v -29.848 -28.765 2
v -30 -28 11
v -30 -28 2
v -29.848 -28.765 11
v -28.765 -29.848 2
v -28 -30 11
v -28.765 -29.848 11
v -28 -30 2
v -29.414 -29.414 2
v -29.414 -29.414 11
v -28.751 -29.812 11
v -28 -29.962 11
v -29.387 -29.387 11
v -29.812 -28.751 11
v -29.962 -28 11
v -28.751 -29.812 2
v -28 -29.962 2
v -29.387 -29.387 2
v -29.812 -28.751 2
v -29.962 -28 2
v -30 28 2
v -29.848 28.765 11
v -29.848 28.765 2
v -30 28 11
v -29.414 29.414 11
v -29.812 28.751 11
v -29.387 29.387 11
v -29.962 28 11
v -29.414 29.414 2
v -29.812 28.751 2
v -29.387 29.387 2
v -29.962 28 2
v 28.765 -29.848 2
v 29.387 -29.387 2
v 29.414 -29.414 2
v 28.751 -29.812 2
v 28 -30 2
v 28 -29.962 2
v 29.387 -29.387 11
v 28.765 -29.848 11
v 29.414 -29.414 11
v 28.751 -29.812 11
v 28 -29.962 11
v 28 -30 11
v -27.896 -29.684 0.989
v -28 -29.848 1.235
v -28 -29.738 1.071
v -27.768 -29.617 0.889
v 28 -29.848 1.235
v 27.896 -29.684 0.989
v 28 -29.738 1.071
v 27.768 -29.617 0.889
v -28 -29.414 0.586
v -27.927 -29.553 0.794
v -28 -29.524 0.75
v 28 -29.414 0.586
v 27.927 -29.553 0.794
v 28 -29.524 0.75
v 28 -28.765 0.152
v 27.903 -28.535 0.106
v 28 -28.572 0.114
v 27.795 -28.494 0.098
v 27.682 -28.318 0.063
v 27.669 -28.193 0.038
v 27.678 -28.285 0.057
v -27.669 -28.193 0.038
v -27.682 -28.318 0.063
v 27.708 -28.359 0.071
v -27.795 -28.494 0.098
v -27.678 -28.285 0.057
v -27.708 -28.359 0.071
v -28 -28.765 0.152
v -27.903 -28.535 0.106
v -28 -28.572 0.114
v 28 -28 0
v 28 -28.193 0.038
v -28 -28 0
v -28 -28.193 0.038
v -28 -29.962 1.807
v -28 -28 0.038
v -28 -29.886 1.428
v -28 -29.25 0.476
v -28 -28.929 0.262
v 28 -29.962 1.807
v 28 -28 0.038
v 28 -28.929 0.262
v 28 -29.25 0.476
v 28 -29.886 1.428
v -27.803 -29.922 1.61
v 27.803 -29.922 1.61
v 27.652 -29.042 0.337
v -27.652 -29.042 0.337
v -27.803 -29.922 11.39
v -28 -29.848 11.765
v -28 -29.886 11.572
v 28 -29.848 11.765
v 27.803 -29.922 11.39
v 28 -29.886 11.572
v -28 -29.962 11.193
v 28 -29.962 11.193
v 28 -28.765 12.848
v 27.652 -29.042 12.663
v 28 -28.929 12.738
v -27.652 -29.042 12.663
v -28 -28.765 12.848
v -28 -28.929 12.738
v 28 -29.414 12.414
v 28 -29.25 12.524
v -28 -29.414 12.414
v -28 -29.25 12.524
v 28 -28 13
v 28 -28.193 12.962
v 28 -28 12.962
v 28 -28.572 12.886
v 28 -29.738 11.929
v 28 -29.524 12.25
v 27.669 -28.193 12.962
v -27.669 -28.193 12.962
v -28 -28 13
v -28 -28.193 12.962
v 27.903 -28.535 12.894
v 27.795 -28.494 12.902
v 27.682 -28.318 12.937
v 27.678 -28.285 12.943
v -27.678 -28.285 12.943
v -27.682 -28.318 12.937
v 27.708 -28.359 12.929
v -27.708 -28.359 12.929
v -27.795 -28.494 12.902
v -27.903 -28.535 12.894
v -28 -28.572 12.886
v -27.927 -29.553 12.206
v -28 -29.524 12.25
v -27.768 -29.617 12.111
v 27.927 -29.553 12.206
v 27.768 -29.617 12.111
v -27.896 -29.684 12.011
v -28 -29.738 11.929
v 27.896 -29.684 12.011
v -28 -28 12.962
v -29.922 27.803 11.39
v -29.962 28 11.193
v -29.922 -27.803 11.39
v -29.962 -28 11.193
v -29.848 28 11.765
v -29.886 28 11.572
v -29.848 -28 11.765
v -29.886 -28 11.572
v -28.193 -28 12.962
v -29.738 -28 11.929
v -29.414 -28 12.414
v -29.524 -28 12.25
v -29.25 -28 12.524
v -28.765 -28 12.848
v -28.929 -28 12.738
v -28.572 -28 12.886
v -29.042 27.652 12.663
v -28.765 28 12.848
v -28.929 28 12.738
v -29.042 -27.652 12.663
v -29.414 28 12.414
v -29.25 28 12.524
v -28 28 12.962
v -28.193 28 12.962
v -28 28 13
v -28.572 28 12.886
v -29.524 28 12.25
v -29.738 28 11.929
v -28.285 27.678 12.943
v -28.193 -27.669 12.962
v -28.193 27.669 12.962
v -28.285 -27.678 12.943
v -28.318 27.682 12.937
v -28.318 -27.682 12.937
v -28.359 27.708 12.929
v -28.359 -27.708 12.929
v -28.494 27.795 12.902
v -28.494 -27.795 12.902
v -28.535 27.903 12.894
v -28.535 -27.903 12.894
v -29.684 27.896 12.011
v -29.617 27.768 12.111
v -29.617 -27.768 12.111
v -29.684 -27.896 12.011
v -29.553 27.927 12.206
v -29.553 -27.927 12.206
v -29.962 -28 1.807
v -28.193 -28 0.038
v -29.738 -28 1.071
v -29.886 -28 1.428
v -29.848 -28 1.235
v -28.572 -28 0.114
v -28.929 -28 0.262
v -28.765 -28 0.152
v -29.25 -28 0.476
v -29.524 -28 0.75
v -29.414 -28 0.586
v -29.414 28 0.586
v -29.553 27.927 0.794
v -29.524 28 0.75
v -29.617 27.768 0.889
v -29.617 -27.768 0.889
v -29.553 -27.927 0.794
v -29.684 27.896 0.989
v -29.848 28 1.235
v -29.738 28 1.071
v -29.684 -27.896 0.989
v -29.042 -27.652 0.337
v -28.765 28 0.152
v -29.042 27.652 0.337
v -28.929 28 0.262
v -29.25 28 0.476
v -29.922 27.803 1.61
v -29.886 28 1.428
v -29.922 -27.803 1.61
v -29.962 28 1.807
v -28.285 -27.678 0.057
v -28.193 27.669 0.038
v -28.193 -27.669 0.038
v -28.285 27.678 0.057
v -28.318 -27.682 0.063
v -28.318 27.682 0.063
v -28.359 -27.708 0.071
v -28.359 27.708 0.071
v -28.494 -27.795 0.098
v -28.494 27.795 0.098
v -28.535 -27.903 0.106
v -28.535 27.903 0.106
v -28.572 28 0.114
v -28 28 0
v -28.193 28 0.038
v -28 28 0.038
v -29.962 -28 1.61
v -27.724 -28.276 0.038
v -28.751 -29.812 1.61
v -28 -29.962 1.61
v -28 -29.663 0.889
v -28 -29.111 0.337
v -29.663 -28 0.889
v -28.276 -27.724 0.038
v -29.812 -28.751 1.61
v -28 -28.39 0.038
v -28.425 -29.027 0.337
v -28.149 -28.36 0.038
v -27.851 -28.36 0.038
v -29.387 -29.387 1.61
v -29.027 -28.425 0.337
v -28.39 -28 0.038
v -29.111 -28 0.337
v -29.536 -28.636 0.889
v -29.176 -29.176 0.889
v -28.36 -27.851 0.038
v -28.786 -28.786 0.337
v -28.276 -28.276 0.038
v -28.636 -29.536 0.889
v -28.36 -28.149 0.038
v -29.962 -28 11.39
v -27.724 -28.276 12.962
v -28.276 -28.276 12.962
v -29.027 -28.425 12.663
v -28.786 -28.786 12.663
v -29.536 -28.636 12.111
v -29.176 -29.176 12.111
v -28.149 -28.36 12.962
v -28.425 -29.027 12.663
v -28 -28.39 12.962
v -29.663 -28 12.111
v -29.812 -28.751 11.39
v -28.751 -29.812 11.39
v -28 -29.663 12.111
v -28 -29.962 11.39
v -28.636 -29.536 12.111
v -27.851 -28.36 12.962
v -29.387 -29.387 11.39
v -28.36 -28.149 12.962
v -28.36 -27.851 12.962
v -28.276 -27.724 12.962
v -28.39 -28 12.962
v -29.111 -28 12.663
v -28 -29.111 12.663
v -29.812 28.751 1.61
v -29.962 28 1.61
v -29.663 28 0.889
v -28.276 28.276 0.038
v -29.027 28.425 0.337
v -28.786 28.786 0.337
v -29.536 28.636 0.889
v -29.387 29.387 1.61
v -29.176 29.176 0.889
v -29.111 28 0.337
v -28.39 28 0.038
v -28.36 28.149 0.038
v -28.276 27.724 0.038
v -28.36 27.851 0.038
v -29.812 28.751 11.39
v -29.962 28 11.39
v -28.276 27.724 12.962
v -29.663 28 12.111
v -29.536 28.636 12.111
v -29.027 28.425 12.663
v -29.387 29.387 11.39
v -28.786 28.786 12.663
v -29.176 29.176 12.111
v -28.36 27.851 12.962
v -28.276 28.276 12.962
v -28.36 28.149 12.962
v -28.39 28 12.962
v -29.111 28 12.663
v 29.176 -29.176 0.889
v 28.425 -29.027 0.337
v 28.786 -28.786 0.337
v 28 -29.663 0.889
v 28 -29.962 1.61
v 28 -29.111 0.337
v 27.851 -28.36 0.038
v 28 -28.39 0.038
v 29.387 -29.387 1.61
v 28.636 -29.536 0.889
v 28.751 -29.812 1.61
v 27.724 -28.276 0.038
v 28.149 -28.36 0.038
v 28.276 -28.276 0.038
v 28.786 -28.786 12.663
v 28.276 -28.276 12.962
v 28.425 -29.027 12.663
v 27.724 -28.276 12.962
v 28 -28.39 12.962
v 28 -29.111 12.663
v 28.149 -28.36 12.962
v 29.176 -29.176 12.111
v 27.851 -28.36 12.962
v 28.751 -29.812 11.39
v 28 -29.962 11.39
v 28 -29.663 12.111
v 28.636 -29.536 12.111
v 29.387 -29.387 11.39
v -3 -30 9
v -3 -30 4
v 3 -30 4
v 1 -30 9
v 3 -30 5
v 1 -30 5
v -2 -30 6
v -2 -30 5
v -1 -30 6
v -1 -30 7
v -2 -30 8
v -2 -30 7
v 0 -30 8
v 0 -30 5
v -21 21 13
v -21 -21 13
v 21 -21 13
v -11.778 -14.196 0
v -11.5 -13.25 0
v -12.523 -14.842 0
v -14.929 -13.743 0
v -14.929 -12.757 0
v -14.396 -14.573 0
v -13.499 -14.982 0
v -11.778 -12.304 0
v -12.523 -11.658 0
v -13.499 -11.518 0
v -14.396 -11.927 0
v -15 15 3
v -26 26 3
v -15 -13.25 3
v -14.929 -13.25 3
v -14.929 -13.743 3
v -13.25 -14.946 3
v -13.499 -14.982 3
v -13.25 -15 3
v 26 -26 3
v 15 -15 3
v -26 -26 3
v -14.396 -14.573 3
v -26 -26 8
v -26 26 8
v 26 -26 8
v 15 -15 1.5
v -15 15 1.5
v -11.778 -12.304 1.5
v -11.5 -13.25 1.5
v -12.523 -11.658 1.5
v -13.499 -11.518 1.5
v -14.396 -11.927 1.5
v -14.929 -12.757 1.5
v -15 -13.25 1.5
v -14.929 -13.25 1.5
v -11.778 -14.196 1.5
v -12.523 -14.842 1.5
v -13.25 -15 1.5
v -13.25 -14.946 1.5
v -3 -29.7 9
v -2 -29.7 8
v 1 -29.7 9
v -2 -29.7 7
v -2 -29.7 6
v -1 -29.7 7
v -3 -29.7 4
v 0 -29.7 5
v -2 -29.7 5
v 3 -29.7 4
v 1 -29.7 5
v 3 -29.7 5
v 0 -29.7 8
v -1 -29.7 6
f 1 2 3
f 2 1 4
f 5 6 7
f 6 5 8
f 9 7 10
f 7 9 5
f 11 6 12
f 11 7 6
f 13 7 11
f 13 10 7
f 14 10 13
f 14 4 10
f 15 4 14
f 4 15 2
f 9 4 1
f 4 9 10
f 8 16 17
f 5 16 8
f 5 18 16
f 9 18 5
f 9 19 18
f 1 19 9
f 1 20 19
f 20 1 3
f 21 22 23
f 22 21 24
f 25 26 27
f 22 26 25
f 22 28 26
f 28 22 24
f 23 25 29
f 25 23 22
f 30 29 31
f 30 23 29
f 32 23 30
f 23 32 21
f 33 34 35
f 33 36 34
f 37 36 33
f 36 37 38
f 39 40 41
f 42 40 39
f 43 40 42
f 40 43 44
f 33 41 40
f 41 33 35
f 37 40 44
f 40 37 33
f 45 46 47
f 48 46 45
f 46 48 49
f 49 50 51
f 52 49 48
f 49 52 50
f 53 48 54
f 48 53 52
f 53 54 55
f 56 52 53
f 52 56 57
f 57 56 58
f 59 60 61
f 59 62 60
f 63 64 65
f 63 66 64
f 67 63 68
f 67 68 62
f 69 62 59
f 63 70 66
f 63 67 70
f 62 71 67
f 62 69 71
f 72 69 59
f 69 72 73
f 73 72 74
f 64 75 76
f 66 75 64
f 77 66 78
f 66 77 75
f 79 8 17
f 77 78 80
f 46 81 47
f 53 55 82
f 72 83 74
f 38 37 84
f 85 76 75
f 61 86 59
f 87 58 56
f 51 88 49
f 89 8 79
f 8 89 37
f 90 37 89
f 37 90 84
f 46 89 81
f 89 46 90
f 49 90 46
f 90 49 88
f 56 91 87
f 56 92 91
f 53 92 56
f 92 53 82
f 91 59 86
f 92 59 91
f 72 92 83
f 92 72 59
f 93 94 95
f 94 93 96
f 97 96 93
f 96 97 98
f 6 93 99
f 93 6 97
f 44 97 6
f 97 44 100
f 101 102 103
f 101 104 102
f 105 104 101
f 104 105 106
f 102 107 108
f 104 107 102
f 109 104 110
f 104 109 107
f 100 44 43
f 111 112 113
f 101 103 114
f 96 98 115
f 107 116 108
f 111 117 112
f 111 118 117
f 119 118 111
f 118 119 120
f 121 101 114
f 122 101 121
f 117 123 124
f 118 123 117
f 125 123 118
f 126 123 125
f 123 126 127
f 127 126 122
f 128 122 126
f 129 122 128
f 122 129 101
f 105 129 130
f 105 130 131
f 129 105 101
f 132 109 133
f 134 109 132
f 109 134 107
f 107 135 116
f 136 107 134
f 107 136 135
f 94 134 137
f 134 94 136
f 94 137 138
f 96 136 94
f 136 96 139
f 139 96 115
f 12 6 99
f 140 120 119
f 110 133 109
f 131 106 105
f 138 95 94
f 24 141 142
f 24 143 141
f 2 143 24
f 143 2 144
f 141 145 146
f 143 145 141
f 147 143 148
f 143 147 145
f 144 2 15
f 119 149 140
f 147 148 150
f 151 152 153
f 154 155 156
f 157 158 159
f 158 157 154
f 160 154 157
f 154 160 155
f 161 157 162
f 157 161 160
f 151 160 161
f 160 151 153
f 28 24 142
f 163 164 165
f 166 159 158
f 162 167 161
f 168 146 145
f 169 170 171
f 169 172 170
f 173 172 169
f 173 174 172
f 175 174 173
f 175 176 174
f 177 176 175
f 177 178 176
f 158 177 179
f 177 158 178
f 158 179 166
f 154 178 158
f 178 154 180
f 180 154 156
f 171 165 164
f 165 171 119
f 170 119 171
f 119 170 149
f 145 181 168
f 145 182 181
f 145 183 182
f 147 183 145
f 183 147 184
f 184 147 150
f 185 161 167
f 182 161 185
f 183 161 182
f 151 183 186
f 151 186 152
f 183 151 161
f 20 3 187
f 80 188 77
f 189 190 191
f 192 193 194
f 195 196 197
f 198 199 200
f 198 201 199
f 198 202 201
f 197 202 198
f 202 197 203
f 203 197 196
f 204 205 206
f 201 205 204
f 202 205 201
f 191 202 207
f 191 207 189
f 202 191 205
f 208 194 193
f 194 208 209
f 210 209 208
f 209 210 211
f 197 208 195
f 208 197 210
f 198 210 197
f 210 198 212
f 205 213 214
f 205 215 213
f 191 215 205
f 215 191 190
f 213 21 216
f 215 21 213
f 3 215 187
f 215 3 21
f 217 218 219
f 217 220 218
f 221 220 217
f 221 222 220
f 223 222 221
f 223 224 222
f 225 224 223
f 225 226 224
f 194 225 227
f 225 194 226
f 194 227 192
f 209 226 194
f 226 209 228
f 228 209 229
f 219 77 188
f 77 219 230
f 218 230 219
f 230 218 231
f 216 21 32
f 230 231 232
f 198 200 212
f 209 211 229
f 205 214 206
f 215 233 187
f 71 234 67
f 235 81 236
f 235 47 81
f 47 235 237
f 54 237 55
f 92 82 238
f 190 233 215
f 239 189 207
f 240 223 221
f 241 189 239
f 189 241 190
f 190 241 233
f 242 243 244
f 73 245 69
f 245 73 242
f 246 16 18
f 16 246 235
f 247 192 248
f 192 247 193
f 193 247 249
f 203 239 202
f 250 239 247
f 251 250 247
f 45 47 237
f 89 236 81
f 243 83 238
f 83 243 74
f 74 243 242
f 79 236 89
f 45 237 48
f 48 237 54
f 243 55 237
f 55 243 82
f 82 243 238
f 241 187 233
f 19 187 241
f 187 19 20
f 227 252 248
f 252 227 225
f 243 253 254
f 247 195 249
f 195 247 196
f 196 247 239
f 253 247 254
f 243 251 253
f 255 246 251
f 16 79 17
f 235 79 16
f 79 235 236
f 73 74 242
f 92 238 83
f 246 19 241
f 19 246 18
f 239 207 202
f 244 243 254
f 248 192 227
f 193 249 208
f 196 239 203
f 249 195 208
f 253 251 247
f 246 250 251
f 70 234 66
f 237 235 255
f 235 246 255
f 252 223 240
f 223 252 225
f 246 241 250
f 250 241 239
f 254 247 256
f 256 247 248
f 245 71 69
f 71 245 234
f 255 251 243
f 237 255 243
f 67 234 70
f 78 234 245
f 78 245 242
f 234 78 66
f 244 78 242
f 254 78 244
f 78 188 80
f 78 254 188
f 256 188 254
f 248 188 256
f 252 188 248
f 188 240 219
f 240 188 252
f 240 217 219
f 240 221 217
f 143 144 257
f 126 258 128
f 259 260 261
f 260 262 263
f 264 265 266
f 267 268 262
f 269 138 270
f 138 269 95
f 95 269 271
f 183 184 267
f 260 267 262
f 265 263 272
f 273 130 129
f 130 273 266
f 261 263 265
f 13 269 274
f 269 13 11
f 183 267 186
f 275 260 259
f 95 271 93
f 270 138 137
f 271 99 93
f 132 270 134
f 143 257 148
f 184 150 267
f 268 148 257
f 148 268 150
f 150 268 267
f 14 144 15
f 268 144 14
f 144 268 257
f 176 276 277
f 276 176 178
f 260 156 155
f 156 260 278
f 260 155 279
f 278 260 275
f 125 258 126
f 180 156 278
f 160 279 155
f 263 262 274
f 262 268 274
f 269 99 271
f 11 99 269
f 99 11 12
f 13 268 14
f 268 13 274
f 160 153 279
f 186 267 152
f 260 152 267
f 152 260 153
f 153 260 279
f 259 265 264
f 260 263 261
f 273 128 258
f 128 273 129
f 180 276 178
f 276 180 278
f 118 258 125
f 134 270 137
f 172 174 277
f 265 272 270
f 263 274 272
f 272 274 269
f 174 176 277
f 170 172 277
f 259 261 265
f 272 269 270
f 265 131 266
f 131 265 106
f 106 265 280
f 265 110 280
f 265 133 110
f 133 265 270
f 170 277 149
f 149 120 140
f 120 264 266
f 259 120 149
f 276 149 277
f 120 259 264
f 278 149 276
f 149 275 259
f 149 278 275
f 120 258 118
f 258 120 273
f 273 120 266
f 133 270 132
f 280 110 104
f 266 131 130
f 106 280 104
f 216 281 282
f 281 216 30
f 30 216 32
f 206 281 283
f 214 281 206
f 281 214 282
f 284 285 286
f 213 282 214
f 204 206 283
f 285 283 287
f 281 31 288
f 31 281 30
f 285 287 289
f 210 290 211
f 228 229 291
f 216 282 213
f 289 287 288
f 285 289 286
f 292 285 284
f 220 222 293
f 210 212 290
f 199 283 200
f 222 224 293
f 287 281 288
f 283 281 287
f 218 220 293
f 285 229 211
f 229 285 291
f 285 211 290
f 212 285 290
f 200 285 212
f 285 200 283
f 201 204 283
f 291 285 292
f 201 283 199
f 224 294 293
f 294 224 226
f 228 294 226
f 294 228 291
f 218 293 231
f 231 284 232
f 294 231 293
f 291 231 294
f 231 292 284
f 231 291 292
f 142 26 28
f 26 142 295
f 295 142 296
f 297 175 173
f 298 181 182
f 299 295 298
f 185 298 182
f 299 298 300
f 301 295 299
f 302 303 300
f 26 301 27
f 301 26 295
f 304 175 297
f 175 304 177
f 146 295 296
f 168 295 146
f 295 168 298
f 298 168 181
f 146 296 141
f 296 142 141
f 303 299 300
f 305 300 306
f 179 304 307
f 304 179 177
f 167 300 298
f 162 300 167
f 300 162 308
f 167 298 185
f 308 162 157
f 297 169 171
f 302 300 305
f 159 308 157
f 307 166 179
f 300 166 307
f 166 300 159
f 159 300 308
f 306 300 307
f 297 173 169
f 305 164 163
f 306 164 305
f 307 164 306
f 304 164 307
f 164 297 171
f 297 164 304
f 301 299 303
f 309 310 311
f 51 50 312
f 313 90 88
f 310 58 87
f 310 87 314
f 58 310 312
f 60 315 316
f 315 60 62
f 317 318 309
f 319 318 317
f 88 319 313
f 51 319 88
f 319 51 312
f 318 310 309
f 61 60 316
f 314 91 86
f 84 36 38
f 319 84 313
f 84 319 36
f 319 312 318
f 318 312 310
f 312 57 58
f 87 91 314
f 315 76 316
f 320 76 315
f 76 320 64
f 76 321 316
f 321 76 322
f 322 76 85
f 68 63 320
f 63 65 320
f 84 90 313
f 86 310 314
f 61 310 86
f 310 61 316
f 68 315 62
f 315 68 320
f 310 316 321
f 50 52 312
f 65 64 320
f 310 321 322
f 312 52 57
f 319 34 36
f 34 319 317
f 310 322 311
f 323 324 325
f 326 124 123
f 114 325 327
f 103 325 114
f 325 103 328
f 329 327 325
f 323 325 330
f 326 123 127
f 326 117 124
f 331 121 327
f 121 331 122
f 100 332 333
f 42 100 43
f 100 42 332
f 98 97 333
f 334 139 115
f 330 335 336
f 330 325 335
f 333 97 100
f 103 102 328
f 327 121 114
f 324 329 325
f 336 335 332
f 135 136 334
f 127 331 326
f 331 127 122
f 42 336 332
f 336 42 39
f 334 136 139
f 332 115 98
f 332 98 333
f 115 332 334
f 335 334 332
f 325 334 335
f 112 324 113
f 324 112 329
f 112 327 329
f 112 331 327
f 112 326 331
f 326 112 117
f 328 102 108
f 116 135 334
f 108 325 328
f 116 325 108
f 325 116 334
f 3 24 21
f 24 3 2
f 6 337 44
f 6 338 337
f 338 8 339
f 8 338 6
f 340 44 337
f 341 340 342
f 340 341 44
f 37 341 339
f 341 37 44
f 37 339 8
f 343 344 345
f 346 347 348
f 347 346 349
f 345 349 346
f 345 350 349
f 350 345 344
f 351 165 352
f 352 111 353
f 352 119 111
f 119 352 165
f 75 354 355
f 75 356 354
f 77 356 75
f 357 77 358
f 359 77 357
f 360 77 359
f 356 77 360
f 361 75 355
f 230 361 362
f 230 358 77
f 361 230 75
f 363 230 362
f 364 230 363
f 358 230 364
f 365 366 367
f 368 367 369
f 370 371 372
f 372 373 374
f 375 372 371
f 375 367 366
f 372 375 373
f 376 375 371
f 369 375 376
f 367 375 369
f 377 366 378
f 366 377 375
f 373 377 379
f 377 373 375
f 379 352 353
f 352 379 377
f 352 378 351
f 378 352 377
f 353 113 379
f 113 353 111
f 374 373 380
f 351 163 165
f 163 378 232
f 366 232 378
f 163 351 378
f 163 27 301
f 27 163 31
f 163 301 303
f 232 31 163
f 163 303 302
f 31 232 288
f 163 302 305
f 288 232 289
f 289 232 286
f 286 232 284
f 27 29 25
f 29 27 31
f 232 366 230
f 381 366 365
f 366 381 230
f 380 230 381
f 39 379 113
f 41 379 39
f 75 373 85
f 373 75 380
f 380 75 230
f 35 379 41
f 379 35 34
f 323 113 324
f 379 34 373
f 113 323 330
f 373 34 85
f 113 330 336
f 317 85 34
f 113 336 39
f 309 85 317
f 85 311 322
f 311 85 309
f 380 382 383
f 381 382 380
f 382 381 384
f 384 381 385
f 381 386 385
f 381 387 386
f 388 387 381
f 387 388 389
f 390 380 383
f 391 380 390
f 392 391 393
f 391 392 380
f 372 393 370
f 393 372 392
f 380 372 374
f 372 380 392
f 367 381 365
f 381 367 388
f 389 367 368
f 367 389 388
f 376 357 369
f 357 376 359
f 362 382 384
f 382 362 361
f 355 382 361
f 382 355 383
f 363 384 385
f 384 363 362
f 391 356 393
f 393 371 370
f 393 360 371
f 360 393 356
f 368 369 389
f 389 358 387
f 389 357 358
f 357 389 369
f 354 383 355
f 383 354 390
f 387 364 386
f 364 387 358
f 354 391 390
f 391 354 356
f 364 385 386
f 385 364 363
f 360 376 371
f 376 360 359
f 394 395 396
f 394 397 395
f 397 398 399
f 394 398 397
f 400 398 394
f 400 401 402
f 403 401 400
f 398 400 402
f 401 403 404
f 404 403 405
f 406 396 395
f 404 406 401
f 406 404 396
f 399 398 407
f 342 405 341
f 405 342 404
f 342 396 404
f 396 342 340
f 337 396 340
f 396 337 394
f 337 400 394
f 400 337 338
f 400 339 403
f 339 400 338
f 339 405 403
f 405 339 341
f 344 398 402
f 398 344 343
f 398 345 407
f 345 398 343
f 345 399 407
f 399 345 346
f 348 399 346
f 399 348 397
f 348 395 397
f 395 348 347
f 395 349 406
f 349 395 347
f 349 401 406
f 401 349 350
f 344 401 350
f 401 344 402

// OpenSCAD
// [FL_INDEX: keywords="openscad, 3d_parametric, Universal_Art_Frame, csg_solid" | COT="Parametric OpenSCAD design from 3DCodeverse"]
// Title: Universal Art Frame

// Thickness of cord
T=1.5;
// Width of bracket
w=60;
// Thickness of wall
wall=4;
// Minimum thickness of picture sandwich
minT=5;
// Maximum thickness of picture sandwich
maxT=10;
// radius of rounded edges
r=2;

Dhole=T+2;

use <MCAD/boxes.scad>

difference(){
	translate([0,0,maxT/2+T])roundedBox([w,w,maxT+2*T],r,$fn=16);
	difference(){
		translate([0,0,maxT+2*T])cube([w-2*wall,w-2*wall,2*maxT],center=true);
		translate([-w/2,-w/2+wall,2*T+minT])rotate([45,0,0])cube([w,maxT,maxT]);
		translate([-w/2+wall,-w/2,2*T+minT])rotate([0,-45,0])cube([maxT,w,maxT]);
	}
	rotate([0,0,45])translate([0,-w,-1])cube(2*w);
	translate([Dhole/2,0,w/4+T])cube(w/2,center=true);
	translate([0,Dhole/2,w/4+T])cube(w/2,center=true);
	translate(-(w/4-Dhole/2)*[1,1,0])cylinder(r=Dhole/2,h=2*maxT,center=true,$fs=1);
	translate([0,-w/2,(maxT+2*T)/2])rotate([90,0,0])monogram(h=0.6);
}

module monogram(h=1)
linear_extrude(height=h,center=true)
translate(-[3,2.5])union(){
	difference(){
		square([4,5]);
		translate([1,1])square([2,3]);
	}
	square([6,1]);
	translate([0,2])square([2,1]);
}
